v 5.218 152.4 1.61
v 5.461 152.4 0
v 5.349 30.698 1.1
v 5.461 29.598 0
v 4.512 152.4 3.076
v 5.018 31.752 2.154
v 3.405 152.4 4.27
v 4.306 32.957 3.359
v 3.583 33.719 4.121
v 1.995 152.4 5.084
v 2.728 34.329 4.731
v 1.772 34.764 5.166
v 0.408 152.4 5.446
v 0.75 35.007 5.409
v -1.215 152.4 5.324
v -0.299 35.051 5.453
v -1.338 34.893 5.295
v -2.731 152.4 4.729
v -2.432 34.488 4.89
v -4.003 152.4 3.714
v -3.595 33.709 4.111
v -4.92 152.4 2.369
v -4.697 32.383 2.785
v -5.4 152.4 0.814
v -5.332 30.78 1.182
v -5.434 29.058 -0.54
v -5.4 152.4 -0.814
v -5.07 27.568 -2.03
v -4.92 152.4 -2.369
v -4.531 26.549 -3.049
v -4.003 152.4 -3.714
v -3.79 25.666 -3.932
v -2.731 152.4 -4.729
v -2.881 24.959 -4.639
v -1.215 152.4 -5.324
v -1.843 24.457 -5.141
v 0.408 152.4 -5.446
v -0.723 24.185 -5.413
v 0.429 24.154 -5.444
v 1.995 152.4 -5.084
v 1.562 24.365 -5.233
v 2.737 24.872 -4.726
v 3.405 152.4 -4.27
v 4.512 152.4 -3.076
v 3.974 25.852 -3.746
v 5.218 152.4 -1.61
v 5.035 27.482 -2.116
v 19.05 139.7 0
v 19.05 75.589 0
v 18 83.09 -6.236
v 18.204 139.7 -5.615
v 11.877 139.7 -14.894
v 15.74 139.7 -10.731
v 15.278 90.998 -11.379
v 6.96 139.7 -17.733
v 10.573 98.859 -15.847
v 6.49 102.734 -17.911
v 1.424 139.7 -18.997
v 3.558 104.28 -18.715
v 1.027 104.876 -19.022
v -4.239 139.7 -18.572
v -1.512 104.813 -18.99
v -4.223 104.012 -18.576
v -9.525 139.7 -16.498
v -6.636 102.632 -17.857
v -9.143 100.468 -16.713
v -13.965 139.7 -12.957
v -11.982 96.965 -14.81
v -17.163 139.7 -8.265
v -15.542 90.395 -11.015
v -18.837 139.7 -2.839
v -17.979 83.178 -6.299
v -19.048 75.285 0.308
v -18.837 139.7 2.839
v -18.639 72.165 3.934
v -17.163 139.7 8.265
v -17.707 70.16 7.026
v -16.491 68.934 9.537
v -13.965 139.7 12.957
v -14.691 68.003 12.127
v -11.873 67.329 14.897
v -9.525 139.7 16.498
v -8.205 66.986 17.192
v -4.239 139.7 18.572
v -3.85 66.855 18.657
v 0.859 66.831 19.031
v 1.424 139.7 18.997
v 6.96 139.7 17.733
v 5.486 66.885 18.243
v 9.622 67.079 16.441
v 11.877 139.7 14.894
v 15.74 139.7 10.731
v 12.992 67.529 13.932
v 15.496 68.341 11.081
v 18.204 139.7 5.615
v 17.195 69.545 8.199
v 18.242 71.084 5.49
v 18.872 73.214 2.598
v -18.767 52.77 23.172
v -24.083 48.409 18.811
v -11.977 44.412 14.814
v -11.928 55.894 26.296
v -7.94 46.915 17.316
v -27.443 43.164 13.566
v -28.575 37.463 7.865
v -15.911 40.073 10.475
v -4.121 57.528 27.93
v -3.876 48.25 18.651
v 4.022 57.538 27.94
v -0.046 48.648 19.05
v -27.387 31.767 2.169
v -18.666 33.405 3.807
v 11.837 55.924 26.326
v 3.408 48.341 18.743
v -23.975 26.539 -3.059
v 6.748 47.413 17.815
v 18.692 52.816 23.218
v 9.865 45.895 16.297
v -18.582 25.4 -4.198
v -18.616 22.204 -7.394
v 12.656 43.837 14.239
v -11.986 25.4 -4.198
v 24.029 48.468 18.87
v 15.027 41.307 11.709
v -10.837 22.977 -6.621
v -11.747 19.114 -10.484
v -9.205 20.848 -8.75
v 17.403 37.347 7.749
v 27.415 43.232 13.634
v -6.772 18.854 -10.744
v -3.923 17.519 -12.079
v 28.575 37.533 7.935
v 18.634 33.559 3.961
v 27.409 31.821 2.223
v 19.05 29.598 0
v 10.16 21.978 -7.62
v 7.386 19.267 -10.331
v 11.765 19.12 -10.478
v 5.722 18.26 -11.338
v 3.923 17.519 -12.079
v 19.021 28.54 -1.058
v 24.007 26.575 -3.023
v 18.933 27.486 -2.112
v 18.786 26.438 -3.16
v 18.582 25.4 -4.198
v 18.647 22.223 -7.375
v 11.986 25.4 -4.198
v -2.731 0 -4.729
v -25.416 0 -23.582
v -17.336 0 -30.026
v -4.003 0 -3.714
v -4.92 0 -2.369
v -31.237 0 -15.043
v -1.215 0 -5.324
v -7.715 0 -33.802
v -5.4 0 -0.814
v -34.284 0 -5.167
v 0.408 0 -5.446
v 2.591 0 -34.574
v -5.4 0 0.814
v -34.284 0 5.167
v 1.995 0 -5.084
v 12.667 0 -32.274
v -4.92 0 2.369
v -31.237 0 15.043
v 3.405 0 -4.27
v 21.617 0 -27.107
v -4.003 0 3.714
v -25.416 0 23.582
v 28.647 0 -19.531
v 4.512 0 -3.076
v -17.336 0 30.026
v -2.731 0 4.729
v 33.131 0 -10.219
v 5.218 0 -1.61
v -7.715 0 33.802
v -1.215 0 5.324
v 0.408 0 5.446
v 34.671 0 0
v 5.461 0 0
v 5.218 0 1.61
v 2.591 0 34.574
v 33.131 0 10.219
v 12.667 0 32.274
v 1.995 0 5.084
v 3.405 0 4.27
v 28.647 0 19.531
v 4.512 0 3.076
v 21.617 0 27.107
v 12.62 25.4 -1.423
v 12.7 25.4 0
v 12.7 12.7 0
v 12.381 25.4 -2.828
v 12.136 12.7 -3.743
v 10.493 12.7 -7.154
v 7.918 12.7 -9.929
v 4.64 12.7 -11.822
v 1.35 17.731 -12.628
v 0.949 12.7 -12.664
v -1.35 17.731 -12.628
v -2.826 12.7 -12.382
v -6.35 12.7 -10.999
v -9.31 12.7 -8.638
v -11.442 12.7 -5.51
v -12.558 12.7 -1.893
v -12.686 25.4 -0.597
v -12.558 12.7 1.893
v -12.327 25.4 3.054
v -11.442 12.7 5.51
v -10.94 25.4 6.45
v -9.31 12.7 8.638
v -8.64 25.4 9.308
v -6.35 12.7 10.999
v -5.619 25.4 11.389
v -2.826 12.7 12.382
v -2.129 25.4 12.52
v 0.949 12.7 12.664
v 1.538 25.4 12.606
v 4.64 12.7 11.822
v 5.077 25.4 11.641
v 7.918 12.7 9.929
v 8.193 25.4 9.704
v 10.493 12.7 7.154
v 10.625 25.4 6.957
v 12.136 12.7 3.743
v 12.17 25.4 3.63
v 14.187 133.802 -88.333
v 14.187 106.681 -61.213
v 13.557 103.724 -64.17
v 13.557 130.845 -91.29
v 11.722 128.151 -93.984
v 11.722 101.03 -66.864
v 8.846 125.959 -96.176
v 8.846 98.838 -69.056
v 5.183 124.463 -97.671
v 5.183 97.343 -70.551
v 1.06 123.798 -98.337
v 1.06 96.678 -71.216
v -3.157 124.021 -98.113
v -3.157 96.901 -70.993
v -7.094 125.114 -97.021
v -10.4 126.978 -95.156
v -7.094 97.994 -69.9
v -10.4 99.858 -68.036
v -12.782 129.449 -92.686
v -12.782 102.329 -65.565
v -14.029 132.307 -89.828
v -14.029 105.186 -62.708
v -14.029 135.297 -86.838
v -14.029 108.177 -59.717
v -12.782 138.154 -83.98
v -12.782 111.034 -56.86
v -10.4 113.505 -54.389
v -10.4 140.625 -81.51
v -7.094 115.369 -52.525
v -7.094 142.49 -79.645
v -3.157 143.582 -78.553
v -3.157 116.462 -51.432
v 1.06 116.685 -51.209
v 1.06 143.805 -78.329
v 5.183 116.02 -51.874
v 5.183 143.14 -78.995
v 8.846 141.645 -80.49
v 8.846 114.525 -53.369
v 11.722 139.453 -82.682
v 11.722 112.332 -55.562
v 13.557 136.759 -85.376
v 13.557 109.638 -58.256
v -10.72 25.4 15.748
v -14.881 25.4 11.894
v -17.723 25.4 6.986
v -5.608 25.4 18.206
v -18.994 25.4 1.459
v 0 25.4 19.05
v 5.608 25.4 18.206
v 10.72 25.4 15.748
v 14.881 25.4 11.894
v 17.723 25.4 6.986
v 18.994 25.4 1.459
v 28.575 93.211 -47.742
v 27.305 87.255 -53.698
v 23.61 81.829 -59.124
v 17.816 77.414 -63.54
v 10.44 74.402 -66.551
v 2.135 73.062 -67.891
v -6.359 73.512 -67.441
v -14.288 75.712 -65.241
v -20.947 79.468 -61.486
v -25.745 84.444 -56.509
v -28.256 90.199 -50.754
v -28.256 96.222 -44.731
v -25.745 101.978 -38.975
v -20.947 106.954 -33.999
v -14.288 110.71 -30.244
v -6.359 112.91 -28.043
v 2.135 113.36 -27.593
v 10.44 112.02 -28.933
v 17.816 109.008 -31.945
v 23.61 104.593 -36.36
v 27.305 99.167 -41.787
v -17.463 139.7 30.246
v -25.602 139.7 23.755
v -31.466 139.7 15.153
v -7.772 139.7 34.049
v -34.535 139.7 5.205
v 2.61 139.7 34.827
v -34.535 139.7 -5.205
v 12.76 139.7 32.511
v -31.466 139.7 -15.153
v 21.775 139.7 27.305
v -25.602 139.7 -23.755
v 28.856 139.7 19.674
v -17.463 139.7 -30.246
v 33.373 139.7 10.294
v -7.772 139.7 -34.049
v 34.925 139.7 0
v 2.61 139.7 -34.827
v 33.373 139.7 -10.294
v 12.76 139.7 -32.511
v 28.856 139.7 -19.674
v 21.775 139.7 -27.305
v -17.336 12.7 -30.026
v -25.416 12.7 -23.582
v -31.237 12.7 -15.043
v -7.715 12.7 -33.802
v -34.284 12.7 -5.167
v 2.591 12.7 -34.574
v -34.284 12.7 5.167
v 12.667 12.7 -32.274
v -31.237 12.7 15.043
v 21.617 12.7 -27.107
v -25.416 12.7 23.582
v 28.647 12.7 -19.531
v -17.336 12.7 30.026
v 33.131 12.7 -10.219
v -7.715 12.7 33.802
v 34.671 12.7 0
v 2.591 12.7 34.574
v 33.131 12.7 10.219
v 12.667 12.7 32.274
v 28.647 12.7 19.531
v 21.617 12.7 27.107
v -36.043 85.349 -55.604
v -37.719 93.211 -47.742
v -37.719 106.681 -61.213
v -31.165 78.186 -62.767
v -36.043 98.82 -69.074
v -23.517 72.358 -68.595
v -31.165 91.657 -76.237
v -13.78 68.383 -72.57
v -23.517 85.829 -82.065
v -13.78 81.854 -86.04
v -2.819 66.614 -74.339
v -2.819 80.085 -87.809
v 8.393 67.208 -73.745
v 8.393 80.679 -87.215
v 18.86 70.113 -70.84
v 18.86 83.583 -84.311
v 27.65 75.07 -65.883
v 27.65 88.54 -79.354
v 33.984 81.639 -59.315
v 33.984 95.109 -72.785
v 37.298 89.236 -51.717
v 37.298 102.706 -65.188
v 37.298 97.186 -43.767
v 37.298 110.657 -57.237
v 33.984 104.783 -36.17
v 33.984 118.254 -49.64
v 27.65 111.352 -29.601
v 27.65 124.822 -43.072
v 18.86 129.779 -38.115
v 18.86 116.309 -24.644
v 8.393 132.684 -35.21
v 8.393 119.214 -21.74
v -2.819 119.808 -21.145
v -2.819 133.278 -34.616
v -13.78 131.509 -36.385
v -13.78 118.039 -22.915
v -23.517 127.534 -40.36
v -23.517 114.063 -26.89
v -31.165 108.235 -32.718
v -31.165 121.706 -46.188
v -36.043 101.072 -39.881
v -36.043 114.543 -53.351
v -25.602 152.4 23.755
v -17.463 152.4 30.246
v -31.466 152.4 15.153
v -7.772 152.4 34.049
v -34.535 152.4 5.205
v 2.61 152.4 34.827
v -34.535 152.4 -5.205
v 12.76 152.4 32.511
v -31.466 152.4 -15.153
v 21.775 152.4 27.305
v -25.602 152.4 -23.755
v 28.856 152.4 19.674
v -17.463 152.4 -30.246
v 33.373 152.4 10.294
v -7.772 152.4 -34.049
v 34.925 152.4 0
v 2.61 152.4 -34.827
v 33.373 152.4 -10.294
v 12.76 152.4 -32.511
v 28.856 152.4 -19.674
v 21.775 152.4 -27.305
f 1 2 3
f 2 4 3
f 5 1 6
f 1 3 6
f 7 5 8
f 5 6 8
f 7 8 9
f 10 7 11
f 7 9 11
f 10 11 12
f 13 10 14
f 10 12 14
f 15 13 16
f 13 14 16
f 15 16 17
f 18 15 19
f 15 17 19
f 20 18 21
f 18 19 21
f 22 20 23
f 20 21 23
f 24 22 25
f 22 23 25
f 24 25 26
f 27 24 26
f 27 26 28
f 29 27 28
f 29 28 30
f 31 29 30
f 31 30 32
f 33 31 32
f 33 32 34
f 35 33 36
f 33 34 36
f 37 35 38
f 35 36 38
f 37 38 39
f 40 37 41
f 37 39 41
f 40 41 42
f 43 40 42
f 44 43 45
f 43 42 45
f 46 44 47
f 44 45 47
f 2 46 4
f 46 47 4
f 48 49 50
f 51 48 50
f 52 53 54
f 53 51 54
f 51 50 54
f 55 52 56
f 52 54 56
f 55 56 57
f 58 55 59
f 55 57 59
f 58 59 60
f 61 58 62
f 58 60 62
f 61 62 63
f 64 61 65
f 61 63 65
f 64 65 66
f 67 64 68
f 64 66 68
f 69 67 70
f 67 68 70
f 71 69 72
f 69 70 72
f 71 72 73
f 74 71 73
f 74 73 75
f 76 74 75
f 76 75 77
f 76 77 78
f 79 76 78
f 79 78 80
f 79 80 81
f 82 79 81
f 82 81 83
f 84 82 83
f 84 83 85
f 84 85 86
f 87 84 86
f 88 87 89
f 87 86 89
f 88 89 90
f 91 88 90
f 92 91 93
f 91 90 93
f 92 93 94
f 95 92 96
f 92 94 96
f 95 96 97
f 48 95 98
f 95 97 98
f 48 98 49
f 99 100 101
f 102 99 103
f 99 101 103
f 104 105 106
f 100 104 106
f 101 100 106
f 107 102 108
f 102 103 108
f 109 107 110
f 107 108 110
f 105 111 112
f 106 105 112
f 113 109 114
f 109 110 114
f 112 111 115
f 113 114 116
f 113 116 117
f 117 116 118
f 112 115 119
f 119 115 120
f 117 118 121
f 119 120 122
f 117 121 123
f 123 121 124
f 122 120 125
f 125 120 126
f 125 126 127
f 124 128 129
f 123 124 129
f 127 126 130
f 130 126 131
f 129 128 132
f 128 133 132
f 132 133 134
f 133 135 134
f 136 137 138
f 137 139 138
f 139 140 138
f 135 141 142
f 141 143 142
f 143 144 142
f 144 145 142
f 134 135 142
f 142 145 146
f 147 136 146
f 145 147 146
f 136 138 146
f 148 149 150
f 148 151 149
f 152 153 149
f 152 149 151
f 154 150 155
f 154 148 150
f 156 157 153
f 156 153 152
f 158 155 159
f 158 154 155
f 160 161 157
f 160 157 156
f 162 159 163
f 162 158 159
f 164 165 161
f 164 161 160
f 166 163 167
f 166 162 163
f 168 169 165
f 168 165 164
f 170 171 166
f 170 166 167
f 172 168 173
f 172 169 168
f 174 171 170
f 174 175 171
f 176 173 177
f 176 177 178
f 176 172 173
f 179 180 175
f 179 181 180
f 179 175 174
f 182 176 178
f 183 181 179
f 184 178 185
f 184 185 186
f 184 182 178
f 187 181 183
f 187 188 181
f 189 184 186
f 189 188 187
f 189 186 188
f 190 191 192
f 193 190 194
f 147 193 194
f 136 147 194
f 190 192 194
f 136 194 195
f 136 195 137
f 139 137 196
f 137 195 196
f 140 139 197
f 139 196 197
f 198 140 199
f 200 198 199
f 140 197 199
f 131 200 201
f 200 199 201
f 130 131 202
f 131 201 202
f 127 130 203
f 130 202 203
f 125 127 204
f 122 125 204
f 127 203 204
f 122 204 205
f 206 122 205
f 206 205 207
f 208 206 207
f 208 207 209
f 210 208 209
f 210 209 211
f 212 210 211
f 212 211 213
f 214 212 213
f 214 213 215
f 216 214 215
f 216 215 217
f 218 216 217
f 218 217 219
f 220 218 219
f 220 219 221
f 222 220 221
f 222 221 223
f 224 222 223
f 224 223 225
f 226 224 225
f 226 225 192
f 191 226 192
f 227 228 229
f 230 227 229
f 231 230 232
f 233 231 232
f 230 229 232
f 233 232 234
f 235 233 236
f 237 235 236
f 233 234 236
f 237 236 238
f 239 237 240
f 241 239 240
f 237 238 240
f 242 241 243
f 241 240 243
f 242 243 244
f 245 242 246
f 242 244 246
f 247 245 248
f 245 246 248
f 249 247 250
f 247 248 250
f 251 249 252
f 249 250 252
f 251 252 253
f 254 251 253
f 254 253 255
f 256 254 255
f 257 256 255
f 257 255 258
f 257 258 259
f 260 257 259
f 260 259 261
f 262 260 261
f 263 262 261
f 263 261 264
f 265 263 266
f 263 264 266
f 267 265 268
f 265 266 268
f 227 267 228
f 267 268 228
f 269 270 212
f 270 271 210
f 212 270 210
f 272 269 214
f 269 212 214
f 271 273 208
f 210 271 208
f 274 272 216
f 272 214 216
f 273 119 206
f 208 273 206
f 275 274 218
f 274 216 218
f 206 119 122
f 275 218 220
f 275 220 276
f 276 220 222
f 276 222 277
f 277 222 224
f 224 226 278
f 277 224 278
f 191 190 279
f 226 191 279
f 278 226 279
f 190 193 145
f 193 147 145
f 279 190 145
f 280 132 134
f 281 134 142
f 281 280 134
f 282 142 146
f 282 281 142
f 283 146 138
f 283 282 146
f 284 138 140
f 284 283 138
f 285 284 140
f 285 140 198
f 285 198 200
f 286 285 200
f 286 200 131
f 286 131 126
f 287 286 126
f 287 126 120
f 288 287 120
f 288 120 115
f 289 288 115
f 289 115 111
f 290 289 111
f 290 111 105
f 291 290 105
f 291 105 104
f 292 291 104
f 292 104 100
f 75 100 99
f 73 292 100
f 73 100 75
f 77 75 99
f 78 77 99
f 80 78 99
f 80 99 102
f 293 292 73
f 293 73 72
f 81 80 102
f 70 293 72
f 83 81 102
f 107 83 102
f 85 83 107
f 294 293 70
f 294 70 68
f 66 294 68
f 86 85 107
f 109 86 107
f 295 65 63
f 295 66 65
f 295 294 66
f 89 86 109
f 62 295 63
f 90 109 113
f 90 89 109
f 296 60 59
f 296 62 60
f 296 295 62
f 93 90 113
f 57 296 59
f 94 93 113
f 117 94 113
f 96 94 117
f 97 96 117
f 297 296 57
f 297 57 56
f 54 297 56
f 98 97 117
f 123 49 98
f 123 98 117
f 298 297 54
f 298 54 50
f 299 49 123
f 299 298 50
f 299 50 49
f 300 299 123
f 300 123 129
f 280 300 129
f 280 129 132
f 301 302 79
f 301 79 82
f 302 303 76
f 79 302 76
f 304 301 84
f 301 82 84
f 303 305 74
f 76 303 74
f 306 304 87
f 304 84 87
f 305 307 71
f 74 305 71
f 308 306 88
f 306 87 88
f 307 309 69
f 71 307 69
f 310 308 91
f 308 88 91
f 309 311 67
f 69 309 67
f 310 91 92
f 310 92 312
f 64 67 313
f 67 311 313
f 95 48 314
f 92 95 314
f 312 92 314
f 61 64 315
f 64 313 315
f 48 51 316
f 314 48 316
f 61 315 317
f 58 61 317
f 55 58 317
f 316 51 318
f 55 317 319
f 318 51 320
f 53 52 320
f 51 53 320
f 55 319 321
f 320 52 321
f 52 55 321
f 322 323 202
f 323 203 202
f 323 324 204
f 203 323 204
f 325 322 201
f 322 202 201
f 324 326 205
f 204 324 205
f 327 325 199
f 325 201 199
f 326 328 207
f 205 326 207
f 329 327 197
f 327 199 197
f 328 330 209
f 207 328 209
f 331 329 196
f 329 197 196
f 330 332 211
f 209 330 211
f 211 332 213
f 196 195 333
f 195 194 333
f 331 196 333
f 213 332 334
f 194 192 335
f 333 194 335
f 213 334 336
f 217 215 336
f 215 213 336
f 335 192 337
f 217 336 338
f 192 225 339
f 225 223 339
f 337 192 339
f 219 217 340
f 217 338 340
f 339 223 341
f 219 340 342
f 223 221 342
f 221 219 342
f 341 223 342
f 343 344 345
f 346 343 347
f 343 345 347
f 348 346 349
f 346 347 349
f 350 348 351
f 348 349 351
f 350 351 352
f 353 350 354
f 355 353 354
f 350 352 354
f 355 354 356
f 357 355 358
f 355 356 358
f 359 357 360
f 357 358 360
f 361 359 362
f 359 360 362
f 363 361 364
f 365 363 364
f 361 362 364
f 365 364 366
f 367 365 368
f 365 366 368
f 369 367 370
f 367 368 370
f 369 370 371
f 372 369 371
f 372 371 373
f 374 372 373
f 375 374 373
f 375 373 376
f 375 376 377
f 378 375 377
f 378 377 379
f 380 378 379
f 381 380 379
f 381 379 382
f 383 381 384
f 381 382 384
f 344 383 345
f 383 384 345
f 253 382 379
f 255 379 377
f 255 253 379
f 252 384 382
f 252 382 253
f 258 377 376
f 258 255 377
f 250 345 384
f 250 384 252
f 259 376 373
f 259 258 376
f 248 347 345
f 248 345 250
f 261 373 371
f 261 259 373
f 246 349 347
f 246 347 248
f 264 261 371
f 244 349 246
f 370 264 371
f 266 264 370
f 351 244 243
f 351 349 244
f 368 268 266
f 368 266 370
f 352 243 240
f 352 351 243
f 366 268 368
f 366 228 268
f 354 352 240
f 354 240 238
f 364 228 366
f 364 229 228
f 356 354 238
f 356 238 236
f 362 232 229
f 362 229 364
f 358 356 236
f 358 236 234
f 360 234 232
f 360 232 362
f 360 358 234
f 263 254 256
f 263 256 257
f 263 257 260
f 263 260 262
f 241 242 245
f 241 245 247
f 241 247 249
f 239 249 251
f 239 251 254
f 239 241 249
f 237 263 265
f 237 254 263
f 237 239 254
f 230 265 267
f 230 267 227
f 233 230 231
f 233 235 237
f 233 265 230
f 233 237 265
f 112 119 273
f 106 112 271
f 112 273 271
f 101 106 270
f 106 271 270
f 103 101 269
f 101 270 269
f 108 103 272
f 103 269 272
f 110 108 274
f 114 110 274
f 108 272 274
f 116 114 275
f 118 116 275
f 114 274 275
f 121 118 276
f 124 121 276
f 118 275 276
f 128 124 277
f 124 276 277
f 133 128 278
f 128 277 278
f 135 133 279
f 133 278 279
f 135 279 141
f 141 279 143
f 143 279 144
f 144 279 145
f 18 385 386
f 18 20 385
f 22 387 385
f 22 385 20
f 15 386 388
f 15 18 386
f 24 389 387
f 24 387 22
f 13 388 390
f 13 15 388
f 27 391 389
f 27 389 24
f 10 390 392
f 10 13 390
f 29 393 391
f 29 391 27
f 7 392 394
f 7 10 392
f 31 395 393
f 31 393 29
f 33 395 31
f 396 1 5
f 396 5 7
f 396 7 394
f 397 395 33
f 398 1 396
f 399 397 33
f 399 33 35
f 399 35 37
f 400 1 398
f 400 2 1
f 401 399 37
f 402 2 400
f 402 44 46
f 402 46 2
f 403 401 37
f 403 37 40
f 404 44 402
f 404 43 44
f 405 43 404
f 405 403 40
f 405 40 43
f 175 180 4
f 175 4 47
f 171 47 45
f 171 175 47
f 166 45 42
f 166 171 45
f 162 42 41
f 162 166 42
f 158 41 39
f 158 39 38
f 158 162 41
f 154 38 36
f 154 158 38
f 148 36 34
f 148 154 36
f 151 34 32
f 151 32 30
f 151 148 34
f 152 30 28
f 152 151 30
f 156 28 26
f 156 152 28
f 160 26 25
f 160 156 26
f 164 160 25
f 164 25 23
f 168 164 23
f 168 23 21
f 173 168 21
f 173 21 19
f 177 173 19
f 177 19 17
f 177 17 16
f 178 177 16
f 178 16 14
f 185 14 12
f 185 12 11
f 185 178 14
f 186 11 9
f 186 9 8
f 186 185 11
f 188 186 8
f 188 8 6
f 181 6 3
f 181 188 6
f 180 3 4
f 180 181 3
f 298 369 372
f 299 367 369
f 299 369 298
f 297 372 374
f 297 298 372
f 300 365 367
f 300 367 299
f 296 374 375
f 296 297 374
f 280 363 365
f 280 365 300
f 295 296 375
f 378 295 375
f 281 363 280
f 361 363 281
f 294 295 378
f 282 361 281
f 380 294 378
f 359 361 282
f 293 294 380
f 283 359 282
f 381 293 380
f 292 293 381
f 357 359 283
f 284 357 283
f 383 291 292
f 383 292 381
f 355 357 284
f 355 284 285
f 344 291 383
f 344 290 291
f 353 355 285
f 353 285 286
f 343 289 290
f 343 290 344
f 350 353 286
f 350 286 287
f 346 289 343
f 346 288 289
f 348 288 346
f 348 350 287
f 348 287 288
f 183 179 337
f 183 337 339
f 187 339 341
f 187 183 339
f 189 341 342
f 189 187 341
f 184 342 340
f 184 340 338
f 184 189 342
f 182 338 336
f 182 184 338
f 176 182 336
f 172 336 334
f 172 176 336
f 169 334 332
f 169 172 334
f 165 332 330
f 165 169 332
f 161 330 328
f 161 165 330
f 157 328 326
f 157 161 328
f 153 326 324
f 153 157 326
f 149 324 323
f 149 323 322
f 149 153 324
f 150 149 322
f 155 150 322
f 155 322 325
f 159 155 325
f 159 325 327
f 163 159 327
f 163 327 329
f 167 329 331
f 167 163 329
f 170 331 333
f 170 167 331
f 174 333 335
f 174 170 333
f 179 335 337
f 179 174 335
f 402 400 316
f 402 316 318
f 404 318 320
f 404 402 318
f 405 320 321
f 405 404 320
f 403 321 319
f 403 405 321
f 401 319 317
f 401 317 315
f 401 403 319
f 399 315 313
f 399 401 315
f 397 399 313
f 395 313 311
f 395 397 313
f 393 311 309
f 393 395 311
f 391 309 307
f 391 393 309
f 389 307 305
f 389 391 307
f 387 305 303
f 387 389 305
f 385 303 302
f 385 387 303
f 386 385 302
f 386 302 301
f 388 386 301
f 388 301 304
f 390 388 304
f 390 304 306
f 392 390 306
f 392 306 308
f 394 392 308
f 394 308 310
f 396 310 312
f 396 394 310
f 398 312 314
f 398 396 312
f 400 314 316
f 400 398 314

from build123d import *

# Parameters (mm, degrees)
SKETCH1_R      = 12.7
SKETCH1_R_2    = 5.461
EXTRUDE1_DEPTH = 25.4
SKETCH2_R      = 19.05
SKETCH2_R_2    = 5.461
EXTRUDE2_DEPTH = 127
SKETCH5_R      = 34.671
SKETCH5_R_2    = 12.7
EXTRUDE3_DEPTH = 12.7
SKETCH7_R      = 37.719
EXTRUDE4_DEPTH = 19.05
SKETCH9_R      = 28.575
EXTRUDE6_DEPTH = 97.79
SKETCH10_R     = 14.187120342
EXTRUDE7_DEPTH = 38.354
SKETCH11_R     = 34.925
EXTRUDE8_DEPTH = 12.7
SKETCH12_R     = 5.461
EXTRUDE9_DEPTH = 153.4


with BuildPart() as part:
    # Sketch1 → Extrude1 (new body)
    with BuildSketch(Plane(origin=(0, 0, 0), x_dir=(1, 0, 0), z_dir=(0, 1, 0))):
        Circle(SKETCH1_R)
        Circle(SKETCH1_R_2, mode=Mode.SUBTRACT)
    extrude(amount=EXTRUDE1_DEPTH)

    # Sketch2 → Extrude2 (add)
    with BuildSketch(Plane(origin=(0, 25.4, 0), x_dir=(1, 0, 0), z_dir=(0, 1, 0))):
        Circle(SKETCH2_R)
        Circle(SKETCH2_R_2, mode=Mode.SUBTRACT)
    extrude(amount=EXTRUDE2_DEPTH)

    # Sketch5 → Extrude3 (add)
    with BuildSketch(Plane.XZ):
        Circle(SKETCH5_R)
        Circle(SKETCH5_R_2, mode=Mode.SUBTRACT)
    extrude(amount=-EXTRUDE3_DEPTH)



with BuildPart() as body_2:
    # Sketch7 → Extrude4 (new body)
    with BuildSketch(Plane(origin=(0, 106.68136068, -61.21263932), x_dir=(-1, 0, 0), z_dir=(0, -0.707106781, 0.707106781))):
        Circle(SKETCH7_R)
    extrude(amount=EXTRUDE4_DEPTH)


with BuildPart() as part_1:
    add(part.part)

    add(body_2.part)  # Extrude6 merges body 2
    # Sketch9 → Extrude6 (add)
    with BuildSketch(Plane(origin=(0, 83.947, -83.947), x_dir=(1, 0, 0), z_dir=(0, 0.707106781, -0.707106781))):
        with Locations((0, -32.151241205)):
            Circle(SKETCH9_R)
    extrude(amount=-EXTRUDE6_DEPTH)

    # Sketch10 → Extrude7 (add)
    with BuildSketch(Plane(origin=(0, 83.947, -83.947), x_dir=(1, 0, 0), z_dir=(0, 0.707106781, -0.707106781))):
        with Locations((0, -32.151241205)):
            Circle(SKETCH10_R)
    extrude(amount=EXTRUDE7_DEPTH)

    # Sketch11 → Extrude8 (add)
    with BuildSketch(Plane(origin=(0, 152.4, 0), x_dir=(1, 0, 0), z_dir=(0, 1, 0))):
        Circle(SKETCH11_R)
    extrude(amount=-EXTRUDE8_DEPTH)

    # Sketch12 → Extrude9 (cut, through all)
    with BuildSketch(Plane.XZ):
        Circle(SKETCH12_R)
    extrude(amount=-EXTRUDE9_DEPTH, mode=Mode.SUBTRACT)


solid = part_1.part
